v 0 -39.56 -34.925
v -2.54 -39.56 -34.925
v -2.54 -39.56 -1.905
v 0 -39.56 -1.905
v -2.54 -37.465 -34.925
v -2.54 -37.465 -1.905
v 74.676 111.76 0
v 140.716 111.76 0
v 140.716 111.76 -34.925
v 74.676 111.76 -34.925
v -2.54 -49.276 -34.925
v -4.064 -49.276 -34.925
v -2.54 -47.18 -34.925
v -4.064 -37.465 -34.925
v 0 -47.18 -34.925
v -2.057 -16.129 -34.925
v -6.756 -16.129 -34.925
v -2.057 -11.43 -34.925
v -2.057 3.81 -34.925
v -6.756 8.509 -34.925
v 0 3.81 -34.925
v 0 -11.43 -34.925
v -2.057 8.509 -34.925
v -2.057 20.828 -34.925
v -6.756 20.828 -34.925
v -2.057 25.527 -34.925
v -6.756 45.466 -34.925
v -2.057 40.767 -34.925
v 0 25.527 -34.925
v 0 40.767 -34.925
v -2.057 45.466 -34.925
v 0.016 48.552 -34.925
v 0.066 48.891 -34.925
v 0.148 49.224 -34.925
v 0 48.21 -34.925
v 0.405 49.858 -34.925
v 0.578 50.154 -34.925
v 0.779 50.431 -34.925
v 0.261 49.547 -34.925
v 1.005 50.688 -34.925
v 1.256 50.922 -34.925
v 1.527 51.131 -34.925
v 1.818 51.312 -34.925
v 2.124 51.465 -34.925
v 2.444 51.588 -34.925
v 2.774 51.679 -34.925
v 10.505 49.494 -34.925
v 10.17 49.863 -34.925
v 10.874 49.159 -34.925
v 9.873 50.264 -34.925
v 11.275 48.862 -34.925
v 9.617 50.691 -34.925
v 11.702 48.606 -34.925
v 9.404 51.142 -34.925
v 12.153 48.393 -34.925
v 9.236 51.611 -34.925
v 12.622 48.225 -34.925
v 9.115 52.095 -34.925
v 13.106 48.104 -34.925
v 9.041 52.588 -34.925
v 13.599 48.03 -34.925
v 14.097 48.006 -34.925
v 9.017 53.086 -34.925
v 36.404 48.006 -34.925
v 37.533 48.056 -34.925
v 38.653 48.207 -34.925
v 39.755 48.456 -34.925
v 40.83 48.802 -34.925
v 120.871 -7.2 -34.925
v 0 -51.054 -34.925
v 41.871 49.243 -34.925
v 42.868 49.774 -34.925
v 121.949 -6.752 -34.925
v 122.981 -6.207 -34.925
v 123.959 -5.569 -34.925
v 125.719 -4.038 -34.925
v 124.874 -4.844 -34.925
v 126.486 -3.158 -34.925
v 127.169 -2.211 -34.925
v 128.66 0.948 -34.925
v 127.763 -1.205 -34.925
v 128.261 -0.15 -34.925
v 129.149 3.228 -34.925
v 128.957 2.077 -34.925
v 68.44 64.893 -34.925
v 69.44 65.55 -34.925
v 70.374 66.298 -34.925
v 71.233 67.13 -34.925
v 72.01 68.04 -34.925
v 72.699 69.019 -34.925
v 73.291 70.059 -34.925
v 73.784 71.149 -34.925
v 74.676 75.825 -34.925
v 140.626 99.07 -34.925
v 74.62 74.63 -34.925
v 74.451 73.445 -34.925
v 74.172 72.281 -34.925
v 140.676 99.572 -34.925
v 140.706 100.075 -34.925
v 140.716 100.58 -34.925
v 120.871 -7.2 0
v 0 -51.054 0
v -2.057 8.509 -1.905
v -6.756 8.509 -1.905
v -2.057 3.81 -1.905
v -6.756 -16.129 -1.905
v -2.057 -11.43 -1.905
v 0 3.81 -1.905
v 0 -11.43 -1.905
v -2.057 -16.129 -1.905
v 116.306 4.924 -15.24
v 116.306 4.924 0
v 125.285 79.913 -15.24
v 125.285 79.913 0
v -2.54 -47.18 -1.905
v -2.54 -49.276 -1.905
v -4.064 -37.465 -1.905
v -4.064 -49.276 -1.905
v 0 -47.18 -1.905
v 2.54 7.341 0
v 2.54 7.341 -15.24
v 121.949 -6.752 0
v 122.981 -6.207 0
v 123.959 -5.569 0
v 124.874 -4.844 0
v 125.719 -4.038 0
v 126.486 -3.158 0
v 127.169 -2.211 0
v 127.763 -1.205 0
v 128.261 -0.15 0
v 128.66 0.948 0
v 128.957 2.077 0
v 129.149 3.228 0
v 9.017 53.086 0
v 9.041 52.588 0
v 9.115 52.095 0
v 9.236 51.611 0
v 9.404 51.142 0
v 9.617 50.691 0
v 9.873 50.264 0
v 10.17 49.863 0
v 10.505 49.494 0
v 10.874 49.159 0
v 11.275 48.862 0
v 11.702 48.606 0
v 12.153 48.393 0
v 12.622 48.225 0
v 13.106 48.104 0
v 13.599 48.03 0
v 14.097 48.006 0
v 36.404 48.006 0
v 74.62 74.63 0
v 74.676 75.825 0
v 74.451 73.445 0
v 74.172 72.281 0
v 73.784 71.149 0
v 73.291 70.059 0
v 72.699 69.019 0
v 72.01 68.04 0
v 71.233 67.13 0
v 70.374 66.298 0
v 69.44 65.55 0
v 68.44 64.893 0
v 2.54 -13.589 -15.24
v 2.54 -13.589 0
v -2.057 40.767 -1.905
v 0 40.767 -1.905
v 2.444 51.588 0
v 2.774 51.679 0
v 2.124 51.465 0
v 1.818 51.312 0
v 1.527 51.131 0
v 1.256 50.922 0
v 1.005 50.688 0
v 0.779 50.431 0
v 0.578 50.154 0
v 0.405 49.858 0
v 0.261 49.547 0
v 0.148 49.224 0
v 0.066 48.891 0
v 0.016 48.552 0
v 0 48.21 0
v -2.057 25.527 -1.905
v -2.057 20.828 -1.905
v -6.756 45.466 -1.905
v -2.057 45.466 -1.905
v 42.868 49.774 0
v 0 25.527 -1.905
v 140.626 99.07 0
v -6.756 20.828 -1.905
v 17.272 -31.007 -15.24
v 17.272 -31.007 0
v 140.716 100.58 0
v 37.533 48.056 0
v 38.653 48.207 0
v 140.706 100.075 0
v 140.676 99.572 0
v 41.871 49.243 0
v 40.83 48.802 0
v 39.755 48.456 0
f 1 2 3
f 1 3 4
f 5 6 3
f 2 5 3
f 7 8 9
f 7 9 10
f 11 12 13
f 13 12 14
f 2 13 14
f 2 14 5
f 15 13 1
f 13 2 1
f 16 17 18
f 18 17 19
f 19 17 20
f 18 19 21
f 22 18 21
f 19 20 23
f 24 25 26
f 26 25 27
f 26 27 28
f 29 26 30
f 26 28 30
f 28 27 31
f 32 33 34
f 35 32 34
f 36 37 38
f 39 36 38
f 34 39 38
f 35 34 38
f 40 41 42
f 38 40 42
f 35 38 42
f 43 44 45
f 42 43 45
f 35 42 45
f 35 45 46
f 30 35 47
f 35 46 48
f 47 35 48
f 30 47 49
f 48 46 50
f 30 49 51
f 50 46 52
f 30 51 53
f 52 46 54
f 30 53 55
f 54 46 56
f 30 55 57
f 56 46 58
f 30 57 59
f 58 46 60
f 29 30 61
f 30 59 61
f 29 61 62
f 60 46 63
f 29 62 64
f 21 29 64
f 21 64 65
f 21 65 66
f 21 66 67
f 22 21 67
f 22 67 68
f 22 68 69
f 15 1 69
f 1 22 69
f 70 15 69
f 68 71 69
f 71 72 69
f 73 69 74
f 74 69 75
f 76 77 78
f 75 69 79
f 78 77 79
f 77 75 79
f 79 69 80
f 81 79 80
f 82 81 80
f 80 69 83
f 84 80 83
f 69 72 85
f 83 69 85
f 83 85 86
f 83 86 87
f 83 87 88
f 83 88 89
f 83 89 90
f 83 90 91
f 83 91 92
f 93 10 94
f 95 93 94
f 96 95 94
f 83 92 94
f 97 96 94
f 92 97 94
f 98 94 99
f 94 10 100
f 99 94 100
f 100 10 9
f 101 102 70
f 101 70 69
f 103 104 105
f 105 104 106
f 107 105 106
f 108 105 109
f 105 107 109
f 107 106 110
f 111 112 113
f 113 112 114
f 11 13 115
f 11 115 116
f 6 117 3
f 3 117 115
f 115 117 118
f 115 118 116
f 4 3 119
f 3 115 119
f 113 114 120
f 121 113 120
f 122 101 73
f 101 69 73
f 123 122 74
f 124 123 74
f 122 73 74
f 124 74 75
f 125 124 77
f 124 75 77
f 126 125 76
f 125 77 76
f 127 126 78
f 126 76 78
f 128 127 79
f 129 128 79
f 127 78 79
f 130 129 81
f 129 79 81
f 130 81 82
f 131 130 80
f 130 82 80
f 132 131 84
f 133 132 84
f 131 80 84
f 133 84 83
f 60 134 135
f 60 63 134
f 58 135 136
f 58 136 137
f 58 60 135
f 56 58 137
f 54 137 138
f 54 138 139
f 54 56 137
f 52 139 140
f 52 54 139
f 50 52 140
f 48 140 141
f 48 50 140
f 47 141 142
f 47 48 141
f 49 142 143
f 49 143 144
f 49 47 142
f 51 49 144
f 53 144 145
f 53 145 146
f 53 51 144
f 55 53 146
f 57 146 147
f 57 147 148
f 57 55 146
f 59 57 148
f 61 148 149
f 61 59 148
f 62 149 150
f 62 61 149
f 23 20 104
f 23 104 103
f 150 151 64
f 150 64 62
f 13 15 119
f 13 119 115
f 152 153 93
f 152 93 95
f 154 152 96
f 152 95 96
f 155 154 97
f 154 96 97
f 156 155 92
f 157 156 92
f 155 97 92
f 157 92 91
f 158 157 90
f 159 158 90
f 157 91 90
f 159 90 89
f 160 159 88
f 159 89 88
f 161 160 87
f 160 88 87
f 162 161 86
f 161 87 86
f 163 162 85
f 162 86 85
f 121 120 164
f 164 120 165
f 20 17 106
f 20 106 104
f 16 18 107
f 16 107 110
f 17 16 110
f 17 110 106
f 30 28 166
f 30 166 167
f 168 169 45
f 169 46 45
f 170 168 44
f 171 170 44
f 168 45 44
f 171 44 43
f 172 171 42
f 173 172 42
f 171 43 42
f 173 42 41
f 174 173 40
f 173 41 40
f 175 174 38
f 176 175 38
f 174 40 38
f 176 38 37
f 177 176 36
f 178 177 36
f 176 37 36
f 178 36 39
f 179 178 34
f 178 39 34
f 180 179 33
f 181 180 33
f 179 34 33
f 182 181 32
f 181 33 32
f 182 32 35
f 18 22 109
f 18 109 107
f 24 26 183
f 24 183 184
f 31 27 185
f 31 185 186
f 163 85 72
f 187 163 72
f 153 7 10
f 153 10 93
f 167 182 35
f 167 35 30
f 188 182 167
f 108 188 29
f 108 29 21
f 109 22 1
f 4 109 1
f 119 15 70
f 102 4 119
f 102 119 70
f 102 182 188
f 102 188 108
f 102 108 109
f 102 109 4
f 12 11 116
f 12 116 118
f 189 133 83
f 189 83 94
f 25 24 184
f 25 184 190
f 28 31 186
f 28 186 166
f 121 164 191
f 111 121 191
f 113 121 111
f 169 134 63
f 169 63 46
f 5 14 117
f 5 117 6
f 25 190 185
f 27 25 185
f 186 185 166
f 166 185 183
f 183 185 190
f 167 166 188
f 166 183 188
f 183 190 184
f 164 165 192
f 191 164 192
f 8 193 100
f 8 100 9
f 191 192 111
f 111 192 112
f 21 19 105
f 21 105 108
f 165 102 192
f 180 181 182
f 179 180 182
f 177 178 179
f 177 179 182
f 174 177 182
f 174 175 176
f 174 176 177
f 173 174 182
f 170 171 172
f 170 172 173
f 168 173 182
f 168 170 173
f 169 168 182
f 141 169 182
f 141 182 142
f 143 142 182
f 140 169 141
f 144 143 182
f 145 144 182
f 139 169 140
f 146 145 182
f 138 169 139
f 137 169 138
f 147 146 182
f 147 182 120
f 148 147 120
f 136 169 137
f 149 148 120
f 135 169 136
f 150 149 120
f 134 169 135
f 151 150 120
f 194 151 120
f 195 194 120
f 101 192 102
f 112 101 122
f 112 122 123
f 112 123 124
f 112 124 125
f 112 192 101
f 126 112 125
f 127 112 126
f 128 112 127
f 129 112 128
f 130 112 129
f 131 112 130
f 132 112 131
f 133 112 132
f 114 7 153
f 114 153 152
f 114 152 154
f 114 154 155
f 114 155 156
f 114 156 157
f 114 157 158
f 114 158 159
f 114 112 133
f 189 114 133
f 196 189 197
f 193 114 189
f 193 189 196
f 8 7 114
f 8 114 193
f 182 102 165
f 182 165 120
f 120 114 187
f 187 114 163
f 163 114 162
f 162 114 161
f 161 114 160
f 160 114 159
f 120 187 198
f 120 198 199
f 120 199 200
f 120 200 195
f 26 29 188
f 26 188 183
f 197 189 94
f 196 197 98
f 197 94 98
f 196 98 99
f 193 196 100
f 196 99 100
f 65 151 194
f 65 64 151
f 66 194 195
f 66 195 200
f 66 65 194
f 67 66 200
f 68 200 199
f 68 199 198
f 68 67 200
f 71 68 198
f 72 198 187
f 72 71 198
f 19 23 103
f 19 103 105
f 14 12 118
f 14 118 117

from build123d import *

# Parameters (mm, degrees)
F1_DEPTH = 34.925
F3_DEPTH = 33.02
F4_R     = 12.7
F5_R     = 5.07999
F6_R     = 3.556
F8_DEPTH = 15.24


# Not quite as in the source:
# - a fillet or chamfer is up to 0.001 mm smaller than in the source, because OpenCascade refuses the exact size


with BuildPart() as f1:
    # F0 (on Top) → F1 (new body)
    with BuildSketch(Plane.XY):
        Polygon((9.017, 53.086), (0, 51.054), (0, -51.054), (128.219697074, -4.5338571988), (140.716, 99.822), (140.716, 111.76), (74.676, 111.76), (74.676, 68.58), (39.878, 48.006), (9.017, 48.006), align=None)
    extrude(amount=-F1_DEPTH)

    # F2 (on face) → F3 (join)
    with BuildSketch(Plane(origin=(0, 0, -34.925), x_dir=(1, 0, 0), z_dir=(0, 0, -1))):
        Polygon((-2.0574, -40.767), (0, -40.767), (0, -25.527), (-2.0574, -25.527), (-2.0574, -20.828), (-6.7564, -20.828), (-6.7564, -45.466), (-2.0574, -45.466), align=None)
        Polygon((-2.54, 39.5605), (0, 39.5605), (0, 47.1805), (-2.54, 47.1805), (-2.54, 49.276), (-4.064, 49.276), (-4.064, 37.465), (-2.54, 37.465), align=None)
        Polygon((-2.0574, -3.81), (0, -3.81), (0, 11.43), (-2.0574, 11.43), (-2.0574, 16.129), (-6.7564, 16.129), (-6.7564, -8.509), (-2.0574, -8.509), align=None)
    extrude(amount=-F3_DEPTH)

    # F4
    f4_edges = [f1.edges().sort_by_distance(p)[0] for p in [
        (39.878, 48.006, -17.4625),
        (74.676, 68.58, -17.4625),
        (128.219697, -4.533857, -17.4625),
        (140.716, 99.822, -17.4625),
    ]]
    fillet(f4_edges, radius=F4_R)

    # F5 (radius 5.08 in the source; OpenCascade refuses exactly that, so slightly less here)
    f5_edges = [f1.edges().sort_by_distance(p)[0] for p in [
        (9.017, 48.006, -17.4625),
    ]]
    fillet(f5_edges, radius=F5_R)

    # F6
    f6_edges = [f1.edges().sort_by_distance(p)[0] for p in [
        (0, 51.054, -17.4625),
    ]]
    fillet(f6_edges, radius=F6_R)

    # F7 (on face) → F8 (cut)
    with BuildSketch(Plane.XY):
        Polygon((116.3056778405, 4.923799024), (125.2853724235, 79.9126762258), (2.54, 7.34059472), (2.54, -13.589), (17.272, -31.0071923946), align=None)
    extrude(amount=-F8_DEPTH, mode=Mode.SUBTRACT)


solid = f1.part
